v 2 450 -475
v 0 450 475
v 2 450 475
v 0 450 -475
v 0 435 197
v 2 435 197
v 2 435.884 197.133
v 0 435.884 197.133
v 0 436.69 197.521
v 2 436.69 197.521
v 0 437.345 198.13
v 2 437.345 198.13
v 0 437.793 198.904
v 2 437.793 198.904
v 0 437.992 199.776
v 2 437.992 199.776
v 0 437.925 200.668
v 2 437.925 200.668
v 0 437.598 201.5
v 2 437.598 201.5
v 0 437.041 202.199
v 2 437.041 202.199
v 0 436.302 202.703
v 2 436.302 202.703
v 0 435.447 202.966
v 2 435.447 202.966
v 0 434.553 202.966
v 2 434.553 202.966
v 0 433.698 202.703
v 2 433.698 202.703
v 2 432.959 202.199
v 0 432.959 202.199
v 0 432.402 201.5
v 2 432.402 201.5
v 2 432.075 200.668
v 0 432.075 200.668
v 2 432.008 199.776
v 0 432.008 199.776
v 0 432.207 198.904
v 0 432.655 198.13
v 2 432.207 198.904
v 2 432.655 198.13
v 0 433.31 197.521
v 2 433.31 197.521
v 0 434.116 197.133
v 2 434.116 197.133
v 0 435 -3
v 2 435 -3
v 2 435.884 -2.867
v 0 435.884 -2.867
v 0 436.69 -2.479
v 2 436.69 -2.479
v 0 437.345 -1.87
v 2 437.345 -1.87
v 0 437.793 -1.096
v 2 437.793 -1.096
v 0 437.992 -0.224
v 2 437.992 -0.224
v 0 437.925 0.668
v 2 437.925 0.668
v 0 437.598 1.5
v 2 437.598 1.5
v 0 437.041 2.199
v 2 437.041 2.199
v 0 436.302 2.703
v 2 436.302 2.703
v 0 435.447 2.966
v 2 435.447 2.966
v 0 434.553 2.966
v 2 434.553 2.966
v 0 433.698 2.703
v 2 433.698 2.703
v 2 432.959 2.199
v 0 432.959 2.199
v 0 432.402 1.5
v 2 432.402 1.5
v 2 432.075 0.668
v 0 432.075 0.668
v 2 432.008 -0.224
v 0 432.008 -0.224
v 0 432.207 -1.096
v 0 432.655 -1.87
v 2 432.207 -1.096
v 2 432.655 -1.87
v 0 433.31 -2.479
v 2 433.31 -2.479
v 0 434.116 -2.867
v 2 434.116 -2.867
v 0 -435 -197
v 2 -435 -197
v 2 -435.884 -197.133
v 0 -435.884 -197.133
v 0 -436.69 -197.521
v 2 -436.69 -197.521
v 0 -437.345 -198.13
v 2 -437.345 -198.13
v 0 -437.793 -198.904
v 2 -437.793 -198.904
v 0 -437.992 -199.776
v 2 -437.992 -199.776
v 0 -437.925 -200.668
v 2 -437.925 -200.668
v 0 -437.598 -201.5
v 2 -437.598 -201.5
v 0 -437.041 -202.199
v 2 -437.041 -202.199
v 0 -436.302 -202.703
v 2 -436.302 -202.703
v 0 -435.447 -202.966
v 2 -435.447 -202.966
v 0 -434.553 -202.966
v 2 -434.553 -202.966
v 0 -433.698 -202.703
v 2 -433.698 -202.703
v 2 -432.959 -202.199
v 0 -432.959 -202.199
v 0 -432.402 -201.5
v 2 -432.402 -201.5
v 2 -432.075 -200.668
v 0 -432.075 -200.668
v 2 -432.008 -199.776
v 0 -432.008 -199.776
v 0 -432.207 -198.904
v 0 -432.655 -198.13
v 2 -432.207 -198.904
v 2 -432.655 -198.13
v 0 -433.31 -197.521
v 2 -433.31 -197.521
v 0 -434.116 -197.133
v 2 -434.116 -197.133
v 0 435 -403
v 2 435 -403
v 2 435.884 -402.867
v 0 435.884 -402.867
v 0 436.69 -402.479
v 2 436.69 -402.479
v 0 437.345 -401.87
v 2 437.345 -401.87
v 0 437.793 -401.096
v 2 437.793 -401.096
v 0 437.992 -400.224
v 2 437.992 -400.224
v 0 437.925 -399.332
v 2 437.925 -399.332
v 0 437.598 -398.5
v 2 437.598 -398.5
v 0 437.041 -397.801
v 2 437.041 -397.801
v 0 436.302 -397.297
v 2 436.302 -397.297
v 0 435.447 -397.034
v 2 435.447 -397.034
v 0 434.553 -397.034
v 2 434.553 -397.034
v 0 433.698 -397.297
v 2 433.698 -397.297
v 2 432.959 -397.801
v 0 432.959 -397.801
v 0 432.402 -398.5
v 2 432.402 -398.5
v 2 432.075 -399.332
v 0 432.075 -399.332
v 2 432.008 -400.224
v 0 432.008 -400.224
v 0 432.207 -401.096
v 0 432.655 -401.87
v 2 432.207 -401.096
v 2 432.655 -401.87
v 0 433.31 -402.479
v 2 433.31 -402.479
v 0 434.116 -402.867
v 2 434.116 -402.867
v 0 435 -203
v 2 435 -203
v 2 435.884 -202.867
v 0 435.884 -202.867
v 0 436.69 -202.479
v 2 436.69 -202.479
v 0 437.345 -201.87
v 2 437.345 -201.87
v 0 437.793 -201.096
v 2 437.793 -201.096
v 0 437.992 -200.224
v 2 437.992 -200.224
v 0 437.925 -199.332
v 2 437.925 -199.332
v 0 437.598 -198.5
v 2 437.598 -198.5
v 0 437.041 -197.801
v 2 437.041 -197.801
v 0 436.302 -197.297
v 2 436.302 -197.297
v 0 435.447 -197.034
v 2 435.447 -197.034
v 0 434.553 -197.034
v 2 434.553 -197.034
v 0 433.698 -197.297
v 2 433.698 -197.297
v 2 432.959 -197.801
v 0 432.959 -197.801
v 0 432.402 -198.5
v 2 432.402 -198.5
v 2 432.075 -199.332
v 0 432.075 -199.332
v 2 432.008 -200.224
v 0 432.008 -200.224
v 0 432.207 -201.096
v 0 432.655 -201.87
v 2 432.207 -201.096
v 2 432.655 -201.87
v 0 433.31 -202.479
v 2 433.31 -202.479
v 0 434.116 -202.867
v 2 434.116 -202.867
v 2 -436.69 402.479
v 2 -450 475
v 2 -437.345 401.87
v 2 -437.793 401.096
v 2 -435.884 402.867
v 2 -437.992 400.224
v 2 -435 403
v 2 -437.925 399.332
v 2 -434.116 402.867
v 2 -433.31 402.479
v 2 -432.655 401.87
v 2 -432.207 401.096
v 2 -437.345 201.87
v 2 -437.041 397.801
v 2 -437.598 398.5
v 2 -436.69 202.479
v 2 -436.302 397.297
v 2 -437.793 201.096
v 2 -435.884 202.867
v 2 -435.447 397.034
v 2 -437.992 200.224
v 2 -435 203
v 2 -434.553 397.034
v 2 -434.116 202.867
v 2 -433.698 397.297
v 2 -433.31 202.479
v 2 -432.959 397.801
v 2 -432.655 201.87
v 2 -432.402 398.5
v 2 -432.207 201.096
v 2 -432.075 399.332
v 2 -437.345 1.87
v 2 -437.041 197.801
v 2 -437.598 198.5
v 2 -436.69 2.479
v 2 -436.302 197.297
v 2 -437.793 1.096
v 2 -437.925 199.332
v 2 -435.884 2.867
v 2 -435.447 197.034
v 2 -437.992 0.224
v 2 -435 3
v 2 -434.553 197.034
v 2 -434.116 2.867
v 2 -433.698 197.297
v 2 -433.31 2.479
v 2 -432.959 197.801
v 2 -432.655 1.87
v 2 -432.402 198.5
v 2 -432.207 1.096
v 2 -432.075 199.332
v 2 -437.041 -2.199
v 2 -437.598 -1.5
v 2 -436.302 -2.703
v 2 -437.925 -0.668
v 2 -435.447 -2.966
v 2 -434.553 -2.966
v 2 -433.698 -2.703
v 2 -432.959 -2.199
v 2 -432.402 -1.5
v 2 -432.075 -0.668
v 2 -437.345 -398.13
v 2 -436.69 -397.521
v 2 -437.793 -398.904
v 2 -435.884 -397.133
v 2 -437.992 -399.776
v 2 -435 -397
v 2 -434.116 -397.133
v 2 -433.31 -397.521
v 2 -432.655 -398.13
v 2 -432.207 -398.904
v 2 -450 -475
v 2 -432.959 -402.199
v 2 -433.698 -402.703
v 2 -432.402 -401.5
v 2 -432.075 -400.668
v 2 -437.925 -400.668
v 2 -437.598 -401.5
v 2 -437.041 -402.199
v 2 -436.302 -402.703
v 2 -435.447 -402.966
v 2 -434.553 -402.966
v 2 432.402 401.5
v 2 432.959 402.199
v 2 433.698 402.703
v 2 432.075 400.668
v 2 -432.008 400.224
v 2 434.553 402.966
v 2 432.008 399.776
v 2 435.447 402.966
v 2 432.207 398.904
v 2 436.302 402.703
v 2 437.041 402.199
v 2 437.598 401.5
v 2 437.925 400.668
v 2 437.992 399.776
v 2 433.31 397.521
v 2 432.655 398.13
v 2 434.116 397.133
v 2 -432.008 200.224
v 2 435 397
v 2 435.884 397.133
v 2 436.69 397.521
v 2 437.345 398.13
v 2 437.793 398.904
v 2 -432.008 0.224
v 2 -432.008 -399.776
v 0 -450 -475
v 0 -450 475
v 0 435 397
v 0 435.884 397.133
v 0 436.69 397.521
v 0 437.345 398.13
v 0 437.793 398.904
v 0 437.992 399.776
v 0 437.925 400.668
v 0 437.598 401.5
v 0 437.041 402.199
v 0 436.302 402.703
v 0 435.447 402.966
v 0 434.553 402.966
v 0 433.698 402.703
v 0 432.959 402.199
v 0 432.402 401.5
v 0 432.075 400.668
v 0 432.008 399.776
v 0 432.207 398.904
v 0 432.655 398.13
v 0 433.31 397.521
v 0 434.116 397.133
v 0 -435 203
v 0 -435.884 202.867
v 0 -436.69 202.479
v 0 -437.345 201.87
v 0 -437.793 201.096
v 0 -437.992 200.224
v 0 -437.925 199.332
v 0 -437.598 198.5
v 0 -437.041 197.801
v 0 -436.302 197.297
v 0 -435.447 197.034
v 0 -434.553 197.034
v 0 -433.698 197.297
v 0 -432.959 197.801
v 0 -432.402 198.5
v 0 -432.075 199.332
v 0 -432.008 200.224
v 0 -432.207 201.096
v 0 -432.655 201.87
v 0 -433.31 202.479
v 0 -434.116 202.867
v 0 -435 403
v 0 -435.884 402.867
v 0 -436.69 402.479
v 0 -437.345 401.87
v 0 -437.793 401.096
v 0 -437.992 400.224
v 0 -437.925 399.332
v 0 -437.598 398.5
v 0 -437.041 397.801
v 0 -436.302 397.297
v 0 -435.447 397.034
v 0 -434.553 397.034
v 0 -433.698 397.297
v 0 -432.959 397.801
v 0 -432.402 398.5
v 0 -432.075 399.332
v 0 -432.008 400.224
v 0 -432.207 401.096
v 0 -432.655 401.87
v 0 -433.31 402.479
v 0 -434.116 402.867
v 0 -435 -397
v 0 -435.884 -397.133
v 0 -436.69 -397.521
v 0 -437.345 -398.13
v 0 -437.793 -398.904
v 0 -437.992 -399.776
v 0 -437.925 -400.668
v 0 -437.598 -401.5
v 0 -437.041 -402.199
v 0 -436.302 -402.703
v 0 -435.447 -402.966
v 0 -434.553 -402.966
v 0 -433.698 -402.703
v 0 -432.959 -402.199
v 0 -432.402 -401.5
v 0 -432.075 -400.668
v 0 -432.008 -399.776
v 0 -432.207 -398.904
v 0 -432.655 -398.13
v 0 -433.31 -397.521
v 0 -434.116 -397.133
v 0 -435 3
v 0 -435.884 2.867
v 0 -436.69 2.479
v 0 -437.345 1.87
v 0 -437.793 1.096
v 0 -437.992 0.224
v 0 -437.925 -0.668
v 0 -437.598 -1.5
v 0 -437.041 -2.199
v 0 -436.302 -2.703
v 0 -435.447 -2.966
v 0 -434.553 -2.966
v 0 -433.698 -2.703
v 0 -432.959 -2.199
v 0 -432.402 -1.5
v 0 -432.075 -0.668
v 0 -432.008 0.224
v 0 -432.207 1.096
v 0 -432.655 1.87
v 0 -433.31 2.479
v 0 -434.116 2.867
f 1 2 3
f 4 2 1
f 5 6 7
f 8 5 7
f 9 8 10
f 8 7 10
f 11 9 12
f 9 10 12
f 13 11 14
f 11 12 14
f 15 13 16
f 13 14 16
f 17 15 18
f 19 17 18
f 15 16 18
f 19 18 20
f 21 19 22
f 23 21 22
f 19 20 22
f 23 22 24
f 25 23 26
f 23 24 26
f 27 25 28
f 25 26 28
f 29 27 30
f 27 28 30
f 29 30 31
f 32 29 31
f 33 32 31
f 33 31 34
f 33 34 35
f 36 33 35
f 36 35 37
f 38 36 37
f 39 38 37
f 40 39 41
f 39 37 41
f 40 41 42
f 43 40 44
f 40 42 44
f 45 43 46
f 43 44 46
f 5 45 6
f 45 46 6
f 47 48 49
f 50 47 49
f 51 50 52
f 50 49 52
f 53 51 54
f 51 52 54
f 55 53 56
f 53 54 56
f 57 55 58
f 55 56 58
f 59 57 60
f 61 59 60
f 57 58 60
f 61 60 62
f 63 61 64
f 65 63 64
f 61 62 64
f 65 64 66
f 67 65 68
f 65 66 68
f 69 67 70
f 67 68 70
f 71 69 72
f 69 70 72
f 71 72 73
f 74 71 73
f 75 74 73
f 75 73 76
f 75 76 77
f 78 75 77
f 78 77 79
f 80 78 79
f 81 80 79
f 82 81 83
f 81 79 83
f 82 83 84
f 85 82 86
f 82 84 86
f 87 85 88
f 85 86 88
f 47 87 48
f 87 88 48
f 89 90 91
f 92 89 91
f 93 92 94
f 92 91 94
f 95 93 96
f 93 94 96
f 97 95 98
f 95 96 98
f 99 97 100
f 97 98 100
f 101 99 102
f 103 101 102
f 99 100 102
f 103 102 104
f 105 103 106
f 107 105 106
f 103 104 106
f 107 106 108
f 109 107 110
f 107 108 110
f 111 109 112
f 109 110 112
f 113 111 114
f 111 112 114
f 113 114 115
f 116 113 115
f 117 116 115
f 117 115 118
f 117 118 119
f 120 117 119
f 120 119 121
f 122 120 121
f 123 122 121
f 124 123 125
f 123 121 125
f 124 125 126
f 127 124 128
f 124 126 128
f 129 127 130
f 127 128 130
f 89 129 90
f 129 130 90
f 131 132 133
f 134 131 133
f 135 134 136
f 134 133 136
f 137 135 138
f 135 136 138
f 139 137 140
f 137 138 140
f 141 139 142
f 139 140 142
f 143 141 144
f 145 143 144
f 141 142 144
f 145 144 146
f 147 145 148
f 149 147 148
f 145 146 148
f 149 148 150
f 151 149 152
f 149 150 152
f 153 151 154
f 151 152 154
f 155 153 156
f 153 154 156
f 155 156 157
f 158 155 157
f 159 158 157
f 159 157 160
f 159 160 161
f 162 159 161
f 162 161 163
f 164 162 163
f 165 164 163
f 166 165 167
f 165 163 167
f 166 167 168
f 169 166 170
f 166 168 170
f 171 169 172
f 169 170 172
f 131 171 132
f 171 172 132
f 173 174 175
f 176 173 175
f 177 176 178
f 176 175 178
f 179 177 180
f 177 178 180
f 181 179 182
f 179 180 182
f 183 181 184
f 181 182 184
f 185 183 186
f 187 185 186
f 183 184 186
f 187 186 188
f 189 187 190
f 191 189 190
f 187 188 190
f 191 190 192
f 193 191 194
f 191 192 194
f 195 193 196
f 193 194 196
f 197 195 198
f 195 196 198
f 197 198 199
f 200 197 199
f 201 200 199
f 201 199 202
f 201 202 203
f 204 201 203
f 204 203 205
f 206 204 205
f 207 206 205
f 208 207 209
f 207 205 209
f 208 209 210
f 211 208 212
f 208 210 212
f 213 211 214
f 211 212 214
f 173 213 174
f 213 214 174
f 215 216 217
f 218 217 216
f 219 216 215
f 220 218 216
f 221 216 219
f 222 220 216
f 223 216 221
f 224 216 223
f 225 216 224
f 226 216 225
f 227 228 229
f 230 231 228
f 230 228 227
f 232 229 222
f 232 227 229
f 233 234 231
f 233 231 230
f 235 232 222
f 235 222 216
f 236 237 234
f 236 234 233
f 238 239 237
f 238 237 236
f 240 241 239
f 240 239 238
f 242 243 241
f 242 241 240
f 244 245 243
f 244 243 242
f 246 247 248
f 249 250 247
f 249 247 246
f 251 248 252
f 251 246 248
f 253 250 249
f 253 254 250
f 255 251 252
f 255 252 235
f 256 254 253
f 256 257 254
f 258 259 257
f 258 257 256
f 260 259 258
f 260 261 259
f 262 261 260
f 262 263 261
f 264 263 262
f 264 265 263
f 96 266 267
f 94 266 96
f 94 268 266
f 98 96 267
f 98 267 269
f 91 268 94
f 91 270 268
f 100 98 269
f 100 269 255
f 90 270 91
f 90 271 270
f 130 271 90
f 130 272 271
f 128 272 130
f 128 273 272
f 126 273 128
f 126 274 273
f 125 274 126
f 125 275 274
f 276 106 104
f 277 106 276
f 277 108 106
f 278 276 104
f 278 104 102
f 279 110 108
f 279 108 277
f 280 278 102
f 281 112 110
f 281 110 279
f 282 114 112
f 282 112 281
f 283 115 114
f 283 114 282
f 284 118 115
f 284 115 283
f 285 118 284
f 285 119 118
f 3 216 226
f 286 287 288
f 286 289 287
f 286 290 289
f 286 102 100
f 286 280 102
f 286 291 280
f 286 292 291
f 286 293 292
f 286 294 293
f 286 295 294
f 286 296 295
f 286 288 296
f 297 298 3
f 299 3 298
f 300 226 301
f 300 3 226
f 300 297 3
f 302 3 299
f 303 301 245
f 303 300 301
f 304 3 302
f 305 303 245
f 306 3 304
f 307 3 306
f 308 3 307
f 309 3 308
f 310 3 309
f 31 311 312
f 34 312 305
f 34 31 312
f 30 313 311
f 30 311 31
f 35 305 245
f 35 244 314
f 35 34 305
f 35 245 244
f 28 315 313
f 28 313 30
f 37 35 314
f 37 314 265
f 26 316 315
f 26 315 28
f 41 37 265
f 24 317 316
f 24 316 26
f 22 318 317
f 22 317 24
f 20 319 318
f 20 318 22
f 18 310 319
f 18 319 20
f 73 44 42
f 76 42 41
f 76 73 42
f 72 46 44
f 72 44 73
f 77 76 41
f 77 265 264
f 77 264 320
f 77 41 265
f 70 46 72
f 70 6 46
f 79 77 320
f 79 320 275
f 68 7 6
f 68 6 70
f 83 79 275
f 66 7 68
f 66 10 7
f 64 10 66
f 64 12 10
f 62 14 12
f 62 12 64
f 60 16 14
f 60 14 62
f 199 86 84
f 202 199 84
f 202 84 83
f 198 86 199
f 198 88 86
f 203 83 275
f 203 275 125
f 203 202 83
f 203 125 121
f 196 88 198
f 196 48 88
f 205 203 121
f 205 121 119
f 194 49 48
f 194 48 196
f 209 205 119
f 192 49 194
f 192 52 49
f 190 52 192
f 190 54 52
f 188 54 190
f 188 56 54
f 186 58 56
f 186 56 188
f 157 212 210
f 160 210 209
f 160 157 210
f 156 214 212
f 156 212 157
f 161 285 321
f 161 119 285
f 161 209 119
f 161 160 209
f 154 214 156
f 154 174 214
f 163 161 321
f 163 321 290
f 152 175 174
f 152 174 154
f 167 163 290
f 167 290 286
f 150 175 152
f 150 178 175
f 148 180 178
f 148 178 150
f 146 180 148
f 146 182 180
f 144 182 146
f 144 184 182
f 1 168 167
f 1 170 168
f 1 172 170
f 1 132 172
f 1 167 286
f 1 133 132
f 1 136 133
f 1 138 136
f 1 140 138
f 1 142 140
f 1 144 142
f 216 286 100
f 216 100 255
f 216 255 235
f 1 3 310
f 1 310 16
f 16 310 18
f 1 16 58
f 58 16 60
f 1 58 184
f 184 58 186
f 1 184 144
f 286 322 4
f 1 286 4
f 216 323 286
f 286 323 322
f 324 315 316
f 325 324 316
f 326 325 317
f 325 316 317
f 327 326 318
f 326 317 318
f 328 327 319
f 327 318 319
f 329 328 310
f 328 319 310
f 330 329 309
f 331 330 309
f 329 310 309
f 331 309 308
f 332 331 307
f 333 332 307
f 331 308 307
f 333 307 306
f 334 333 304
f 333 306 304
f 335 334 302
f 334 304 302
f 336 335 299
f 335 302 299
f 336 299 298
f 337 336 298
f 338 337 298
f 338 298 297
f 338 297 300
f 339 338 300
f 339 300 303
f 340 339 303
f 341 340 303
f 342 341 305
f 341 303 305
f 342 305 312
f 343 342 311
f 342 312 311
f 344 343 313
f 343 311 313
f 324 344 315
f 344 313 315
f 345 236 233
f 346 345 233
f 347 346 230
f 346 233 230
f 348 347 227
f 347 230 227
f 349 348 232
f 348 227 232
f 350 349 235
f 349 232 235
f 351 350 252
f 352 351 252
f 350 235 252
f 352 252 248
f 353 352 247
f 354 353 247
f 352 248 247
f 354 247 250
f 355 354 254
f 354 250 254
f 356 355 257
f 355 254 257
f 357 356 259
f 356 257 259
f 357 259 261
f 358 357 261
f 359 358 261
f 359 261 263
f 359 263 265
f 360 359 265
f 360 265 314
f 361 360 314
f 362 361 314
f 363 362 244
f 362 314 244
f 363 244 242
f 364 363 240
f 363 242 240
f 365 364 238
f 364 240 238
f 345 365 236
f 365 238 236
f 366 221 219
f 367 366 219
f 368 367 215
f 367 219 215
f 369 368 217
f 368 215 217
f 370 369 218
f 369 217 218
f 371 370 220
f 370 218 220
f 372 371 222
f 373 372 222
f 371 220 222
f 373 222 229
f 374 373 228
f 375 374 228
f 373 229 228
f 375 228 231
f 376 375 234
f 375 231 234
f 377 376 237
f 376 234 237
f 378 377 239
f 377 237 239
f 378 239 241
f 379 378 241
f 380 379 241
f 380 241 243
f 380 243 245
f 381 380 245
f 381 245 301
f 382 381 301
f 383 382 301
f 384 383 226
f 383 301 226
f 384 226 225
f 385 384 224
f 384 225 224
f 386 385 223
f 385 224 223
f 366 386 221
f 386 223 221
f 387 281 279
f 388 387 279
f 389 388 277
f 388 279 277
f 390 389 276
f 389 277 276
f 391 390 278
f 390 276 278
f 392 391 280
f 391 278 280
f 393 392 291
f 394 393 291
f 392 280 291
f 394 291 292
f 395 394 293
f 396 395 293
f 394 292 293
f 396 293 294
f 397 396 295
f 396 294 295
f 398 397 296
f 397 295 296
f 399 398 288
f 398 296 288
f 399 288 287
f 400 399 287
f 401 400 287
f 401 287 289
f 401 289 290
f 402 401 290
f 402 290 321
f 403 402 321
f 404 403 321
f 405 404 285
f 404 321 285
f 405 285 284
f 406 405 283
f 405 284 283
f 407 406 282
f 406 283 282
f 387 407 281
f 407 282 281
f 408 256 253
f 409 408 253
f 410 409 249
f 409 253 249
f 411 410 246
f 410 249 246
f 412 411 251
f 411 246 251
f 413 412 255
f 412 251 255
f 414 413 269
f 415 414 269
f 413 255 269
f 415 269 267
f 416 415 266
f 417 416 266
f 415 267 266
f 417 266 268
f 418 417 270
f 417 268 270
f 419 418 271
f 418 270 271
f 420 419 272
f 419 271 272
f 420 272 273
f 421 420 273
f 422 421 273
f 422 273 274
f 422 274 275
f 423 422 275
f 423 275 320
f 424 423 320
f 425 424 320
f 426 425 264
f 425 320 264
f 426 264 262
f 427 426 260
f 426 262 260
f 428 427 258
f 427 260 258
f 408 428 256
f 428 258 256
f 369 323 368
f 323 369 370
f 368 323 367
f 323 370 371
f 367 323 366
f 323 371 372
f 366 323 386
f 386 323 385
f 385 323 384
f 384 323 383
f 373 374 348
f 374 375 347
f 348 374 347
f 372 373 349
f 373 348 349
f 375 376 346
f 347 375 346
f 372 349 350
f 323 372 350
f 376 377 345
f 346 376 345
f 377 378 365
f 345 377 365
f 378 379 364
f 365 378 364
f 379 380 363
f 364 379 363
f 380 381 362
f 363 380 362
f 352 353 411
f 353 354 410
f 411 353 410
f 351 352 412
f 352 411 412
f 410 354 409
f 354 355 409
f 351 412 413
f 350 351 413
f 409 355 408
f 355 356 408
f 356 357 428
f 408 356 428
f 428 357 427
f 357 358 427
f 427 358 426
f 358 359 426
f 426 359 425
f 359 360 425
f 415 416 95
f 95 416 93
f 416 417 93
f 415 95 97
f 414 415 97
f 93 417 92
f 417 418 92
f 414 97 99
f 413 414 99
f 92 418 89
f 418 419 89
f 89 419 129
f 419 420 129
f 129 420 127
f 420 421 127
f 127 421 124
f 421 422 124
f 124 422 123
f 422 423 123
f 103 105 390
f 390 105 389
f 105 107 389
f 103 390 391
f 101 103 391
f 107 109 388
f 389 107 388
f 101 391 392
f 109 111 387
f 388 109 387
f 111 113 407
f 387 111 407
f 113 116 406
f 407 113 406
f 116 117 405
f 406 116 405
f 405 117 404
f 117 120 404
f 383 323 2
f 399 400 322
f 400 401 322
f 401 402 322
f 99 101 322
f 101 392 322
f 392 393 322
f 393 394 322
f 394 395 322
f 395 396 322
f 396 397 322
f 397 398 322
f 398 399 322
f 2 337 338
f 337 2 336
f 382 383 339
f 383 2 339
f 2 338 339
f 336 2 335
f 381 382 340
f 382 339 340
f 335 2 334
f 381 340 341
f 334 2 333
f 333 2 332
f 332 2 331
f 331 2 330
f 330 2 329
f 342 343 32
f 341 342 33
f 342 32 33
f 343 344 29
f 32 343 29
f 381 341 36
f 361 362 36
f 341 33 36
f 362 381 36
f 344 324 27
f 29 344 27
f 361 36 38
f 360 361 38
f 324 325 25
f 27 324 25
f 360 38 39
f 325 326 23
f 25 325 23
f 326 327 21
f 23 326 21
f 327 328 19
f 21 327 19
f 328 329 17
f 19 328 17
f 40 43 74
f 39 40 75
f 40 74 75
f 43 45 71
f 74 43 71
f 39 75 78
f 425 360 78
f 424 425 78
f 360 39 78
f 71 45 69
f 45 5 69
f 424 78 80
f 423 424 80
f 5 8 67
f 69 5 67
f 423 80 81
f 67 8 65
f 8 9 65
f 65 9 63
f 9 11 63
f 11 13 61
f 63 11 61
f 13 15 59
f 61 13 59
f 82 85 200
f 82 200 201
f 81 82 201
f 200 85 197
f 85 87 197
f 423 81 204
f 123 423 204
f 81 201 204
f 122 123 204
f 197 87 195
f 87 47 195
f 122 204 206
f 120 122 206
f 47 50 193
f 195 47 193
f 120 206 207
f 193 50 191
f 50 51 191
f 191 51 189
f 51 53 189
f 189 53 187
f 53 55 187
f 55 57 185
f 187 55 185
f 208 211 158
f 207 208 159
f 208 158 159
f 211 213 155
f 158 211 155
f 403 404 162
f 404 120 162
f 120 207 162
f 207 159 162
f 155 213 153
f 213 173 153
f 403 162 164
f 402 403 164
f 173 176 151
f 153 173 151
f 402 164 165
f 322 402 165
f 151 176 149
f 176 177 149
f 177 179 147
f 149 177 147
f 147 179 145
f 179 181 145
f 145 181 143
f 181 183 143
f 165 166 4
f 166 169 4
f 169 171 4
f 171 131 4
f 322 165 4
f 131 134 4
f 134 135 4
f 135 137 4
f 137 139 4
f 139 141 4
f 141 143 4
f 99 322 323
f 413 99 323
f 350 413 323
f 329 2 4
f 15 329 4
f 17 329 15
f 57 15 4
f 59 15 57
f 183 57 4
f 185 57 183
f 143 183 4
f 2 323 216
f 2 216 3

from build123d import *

# Parameters (mm, degrees)
SKETCH1_W           = 950
SKETCH1_H           = 900
BOSS_EXTRUDE2_DEPTH = 2
SKETCH3_R           = 3
CUT_EXTRUDE1_DEPTH  = 2


with BuildPart() as part:
    # Sketch1 → Boss-Extrude2 (new body)
    with BuildSketch(Plane(origin=(0, 0, 0), x_dir=(0, 0, -1), z_dir=(1, 0, 0))):
        Rectangle(SKETCH1_W, SKETCH1_H)
    extrude(amount=BOSS_EXTRUDE2_DEPTH)

    # Sketch3 → Cut-Extrude1 (cut)
    with BuildSketch(Plane(origin=(2, 0, 0), x_dir=(0, 0, -1), z_dir=(1, 0, 0))):
        with Locations((-400, 435)):
            Circle(SKETCH3_R)
        with Locations((-200, 435)):
            Circle(SKETCH3_R)
        with Locations((0, 435)):
            Circle(SKETCH3_R)
        with Locations((200, 435)):
            Circle(SKETCH3_R)
        with Locations((400, 435)):
            Circle(SKETCH3_R)
        with Locations(Location((400, -435, 0), (0, 0, 180))):
            Circle(SKETCH3_R)
        with Locations(Location((0, -435, 0), (0, 0, 180))):
            Circle(SKETCH3_R)
        with Locations(Location((200, -435, 0), (0, 0, 180))):
            Circle(SKETCH3_R)
        with Locations(Location((-200, -435, 0), (0, 0, 180))):
            Circle(SKETCH3_R)
        with Locations(Location((-400, -435, 0), (0, 0, 180))):
            Circle(SKETCH3_R)
    extrude(amount=-CUT_EXTRUDE1_DEPTH, mode=Mode.SUBTRACT)


solid = part.part
